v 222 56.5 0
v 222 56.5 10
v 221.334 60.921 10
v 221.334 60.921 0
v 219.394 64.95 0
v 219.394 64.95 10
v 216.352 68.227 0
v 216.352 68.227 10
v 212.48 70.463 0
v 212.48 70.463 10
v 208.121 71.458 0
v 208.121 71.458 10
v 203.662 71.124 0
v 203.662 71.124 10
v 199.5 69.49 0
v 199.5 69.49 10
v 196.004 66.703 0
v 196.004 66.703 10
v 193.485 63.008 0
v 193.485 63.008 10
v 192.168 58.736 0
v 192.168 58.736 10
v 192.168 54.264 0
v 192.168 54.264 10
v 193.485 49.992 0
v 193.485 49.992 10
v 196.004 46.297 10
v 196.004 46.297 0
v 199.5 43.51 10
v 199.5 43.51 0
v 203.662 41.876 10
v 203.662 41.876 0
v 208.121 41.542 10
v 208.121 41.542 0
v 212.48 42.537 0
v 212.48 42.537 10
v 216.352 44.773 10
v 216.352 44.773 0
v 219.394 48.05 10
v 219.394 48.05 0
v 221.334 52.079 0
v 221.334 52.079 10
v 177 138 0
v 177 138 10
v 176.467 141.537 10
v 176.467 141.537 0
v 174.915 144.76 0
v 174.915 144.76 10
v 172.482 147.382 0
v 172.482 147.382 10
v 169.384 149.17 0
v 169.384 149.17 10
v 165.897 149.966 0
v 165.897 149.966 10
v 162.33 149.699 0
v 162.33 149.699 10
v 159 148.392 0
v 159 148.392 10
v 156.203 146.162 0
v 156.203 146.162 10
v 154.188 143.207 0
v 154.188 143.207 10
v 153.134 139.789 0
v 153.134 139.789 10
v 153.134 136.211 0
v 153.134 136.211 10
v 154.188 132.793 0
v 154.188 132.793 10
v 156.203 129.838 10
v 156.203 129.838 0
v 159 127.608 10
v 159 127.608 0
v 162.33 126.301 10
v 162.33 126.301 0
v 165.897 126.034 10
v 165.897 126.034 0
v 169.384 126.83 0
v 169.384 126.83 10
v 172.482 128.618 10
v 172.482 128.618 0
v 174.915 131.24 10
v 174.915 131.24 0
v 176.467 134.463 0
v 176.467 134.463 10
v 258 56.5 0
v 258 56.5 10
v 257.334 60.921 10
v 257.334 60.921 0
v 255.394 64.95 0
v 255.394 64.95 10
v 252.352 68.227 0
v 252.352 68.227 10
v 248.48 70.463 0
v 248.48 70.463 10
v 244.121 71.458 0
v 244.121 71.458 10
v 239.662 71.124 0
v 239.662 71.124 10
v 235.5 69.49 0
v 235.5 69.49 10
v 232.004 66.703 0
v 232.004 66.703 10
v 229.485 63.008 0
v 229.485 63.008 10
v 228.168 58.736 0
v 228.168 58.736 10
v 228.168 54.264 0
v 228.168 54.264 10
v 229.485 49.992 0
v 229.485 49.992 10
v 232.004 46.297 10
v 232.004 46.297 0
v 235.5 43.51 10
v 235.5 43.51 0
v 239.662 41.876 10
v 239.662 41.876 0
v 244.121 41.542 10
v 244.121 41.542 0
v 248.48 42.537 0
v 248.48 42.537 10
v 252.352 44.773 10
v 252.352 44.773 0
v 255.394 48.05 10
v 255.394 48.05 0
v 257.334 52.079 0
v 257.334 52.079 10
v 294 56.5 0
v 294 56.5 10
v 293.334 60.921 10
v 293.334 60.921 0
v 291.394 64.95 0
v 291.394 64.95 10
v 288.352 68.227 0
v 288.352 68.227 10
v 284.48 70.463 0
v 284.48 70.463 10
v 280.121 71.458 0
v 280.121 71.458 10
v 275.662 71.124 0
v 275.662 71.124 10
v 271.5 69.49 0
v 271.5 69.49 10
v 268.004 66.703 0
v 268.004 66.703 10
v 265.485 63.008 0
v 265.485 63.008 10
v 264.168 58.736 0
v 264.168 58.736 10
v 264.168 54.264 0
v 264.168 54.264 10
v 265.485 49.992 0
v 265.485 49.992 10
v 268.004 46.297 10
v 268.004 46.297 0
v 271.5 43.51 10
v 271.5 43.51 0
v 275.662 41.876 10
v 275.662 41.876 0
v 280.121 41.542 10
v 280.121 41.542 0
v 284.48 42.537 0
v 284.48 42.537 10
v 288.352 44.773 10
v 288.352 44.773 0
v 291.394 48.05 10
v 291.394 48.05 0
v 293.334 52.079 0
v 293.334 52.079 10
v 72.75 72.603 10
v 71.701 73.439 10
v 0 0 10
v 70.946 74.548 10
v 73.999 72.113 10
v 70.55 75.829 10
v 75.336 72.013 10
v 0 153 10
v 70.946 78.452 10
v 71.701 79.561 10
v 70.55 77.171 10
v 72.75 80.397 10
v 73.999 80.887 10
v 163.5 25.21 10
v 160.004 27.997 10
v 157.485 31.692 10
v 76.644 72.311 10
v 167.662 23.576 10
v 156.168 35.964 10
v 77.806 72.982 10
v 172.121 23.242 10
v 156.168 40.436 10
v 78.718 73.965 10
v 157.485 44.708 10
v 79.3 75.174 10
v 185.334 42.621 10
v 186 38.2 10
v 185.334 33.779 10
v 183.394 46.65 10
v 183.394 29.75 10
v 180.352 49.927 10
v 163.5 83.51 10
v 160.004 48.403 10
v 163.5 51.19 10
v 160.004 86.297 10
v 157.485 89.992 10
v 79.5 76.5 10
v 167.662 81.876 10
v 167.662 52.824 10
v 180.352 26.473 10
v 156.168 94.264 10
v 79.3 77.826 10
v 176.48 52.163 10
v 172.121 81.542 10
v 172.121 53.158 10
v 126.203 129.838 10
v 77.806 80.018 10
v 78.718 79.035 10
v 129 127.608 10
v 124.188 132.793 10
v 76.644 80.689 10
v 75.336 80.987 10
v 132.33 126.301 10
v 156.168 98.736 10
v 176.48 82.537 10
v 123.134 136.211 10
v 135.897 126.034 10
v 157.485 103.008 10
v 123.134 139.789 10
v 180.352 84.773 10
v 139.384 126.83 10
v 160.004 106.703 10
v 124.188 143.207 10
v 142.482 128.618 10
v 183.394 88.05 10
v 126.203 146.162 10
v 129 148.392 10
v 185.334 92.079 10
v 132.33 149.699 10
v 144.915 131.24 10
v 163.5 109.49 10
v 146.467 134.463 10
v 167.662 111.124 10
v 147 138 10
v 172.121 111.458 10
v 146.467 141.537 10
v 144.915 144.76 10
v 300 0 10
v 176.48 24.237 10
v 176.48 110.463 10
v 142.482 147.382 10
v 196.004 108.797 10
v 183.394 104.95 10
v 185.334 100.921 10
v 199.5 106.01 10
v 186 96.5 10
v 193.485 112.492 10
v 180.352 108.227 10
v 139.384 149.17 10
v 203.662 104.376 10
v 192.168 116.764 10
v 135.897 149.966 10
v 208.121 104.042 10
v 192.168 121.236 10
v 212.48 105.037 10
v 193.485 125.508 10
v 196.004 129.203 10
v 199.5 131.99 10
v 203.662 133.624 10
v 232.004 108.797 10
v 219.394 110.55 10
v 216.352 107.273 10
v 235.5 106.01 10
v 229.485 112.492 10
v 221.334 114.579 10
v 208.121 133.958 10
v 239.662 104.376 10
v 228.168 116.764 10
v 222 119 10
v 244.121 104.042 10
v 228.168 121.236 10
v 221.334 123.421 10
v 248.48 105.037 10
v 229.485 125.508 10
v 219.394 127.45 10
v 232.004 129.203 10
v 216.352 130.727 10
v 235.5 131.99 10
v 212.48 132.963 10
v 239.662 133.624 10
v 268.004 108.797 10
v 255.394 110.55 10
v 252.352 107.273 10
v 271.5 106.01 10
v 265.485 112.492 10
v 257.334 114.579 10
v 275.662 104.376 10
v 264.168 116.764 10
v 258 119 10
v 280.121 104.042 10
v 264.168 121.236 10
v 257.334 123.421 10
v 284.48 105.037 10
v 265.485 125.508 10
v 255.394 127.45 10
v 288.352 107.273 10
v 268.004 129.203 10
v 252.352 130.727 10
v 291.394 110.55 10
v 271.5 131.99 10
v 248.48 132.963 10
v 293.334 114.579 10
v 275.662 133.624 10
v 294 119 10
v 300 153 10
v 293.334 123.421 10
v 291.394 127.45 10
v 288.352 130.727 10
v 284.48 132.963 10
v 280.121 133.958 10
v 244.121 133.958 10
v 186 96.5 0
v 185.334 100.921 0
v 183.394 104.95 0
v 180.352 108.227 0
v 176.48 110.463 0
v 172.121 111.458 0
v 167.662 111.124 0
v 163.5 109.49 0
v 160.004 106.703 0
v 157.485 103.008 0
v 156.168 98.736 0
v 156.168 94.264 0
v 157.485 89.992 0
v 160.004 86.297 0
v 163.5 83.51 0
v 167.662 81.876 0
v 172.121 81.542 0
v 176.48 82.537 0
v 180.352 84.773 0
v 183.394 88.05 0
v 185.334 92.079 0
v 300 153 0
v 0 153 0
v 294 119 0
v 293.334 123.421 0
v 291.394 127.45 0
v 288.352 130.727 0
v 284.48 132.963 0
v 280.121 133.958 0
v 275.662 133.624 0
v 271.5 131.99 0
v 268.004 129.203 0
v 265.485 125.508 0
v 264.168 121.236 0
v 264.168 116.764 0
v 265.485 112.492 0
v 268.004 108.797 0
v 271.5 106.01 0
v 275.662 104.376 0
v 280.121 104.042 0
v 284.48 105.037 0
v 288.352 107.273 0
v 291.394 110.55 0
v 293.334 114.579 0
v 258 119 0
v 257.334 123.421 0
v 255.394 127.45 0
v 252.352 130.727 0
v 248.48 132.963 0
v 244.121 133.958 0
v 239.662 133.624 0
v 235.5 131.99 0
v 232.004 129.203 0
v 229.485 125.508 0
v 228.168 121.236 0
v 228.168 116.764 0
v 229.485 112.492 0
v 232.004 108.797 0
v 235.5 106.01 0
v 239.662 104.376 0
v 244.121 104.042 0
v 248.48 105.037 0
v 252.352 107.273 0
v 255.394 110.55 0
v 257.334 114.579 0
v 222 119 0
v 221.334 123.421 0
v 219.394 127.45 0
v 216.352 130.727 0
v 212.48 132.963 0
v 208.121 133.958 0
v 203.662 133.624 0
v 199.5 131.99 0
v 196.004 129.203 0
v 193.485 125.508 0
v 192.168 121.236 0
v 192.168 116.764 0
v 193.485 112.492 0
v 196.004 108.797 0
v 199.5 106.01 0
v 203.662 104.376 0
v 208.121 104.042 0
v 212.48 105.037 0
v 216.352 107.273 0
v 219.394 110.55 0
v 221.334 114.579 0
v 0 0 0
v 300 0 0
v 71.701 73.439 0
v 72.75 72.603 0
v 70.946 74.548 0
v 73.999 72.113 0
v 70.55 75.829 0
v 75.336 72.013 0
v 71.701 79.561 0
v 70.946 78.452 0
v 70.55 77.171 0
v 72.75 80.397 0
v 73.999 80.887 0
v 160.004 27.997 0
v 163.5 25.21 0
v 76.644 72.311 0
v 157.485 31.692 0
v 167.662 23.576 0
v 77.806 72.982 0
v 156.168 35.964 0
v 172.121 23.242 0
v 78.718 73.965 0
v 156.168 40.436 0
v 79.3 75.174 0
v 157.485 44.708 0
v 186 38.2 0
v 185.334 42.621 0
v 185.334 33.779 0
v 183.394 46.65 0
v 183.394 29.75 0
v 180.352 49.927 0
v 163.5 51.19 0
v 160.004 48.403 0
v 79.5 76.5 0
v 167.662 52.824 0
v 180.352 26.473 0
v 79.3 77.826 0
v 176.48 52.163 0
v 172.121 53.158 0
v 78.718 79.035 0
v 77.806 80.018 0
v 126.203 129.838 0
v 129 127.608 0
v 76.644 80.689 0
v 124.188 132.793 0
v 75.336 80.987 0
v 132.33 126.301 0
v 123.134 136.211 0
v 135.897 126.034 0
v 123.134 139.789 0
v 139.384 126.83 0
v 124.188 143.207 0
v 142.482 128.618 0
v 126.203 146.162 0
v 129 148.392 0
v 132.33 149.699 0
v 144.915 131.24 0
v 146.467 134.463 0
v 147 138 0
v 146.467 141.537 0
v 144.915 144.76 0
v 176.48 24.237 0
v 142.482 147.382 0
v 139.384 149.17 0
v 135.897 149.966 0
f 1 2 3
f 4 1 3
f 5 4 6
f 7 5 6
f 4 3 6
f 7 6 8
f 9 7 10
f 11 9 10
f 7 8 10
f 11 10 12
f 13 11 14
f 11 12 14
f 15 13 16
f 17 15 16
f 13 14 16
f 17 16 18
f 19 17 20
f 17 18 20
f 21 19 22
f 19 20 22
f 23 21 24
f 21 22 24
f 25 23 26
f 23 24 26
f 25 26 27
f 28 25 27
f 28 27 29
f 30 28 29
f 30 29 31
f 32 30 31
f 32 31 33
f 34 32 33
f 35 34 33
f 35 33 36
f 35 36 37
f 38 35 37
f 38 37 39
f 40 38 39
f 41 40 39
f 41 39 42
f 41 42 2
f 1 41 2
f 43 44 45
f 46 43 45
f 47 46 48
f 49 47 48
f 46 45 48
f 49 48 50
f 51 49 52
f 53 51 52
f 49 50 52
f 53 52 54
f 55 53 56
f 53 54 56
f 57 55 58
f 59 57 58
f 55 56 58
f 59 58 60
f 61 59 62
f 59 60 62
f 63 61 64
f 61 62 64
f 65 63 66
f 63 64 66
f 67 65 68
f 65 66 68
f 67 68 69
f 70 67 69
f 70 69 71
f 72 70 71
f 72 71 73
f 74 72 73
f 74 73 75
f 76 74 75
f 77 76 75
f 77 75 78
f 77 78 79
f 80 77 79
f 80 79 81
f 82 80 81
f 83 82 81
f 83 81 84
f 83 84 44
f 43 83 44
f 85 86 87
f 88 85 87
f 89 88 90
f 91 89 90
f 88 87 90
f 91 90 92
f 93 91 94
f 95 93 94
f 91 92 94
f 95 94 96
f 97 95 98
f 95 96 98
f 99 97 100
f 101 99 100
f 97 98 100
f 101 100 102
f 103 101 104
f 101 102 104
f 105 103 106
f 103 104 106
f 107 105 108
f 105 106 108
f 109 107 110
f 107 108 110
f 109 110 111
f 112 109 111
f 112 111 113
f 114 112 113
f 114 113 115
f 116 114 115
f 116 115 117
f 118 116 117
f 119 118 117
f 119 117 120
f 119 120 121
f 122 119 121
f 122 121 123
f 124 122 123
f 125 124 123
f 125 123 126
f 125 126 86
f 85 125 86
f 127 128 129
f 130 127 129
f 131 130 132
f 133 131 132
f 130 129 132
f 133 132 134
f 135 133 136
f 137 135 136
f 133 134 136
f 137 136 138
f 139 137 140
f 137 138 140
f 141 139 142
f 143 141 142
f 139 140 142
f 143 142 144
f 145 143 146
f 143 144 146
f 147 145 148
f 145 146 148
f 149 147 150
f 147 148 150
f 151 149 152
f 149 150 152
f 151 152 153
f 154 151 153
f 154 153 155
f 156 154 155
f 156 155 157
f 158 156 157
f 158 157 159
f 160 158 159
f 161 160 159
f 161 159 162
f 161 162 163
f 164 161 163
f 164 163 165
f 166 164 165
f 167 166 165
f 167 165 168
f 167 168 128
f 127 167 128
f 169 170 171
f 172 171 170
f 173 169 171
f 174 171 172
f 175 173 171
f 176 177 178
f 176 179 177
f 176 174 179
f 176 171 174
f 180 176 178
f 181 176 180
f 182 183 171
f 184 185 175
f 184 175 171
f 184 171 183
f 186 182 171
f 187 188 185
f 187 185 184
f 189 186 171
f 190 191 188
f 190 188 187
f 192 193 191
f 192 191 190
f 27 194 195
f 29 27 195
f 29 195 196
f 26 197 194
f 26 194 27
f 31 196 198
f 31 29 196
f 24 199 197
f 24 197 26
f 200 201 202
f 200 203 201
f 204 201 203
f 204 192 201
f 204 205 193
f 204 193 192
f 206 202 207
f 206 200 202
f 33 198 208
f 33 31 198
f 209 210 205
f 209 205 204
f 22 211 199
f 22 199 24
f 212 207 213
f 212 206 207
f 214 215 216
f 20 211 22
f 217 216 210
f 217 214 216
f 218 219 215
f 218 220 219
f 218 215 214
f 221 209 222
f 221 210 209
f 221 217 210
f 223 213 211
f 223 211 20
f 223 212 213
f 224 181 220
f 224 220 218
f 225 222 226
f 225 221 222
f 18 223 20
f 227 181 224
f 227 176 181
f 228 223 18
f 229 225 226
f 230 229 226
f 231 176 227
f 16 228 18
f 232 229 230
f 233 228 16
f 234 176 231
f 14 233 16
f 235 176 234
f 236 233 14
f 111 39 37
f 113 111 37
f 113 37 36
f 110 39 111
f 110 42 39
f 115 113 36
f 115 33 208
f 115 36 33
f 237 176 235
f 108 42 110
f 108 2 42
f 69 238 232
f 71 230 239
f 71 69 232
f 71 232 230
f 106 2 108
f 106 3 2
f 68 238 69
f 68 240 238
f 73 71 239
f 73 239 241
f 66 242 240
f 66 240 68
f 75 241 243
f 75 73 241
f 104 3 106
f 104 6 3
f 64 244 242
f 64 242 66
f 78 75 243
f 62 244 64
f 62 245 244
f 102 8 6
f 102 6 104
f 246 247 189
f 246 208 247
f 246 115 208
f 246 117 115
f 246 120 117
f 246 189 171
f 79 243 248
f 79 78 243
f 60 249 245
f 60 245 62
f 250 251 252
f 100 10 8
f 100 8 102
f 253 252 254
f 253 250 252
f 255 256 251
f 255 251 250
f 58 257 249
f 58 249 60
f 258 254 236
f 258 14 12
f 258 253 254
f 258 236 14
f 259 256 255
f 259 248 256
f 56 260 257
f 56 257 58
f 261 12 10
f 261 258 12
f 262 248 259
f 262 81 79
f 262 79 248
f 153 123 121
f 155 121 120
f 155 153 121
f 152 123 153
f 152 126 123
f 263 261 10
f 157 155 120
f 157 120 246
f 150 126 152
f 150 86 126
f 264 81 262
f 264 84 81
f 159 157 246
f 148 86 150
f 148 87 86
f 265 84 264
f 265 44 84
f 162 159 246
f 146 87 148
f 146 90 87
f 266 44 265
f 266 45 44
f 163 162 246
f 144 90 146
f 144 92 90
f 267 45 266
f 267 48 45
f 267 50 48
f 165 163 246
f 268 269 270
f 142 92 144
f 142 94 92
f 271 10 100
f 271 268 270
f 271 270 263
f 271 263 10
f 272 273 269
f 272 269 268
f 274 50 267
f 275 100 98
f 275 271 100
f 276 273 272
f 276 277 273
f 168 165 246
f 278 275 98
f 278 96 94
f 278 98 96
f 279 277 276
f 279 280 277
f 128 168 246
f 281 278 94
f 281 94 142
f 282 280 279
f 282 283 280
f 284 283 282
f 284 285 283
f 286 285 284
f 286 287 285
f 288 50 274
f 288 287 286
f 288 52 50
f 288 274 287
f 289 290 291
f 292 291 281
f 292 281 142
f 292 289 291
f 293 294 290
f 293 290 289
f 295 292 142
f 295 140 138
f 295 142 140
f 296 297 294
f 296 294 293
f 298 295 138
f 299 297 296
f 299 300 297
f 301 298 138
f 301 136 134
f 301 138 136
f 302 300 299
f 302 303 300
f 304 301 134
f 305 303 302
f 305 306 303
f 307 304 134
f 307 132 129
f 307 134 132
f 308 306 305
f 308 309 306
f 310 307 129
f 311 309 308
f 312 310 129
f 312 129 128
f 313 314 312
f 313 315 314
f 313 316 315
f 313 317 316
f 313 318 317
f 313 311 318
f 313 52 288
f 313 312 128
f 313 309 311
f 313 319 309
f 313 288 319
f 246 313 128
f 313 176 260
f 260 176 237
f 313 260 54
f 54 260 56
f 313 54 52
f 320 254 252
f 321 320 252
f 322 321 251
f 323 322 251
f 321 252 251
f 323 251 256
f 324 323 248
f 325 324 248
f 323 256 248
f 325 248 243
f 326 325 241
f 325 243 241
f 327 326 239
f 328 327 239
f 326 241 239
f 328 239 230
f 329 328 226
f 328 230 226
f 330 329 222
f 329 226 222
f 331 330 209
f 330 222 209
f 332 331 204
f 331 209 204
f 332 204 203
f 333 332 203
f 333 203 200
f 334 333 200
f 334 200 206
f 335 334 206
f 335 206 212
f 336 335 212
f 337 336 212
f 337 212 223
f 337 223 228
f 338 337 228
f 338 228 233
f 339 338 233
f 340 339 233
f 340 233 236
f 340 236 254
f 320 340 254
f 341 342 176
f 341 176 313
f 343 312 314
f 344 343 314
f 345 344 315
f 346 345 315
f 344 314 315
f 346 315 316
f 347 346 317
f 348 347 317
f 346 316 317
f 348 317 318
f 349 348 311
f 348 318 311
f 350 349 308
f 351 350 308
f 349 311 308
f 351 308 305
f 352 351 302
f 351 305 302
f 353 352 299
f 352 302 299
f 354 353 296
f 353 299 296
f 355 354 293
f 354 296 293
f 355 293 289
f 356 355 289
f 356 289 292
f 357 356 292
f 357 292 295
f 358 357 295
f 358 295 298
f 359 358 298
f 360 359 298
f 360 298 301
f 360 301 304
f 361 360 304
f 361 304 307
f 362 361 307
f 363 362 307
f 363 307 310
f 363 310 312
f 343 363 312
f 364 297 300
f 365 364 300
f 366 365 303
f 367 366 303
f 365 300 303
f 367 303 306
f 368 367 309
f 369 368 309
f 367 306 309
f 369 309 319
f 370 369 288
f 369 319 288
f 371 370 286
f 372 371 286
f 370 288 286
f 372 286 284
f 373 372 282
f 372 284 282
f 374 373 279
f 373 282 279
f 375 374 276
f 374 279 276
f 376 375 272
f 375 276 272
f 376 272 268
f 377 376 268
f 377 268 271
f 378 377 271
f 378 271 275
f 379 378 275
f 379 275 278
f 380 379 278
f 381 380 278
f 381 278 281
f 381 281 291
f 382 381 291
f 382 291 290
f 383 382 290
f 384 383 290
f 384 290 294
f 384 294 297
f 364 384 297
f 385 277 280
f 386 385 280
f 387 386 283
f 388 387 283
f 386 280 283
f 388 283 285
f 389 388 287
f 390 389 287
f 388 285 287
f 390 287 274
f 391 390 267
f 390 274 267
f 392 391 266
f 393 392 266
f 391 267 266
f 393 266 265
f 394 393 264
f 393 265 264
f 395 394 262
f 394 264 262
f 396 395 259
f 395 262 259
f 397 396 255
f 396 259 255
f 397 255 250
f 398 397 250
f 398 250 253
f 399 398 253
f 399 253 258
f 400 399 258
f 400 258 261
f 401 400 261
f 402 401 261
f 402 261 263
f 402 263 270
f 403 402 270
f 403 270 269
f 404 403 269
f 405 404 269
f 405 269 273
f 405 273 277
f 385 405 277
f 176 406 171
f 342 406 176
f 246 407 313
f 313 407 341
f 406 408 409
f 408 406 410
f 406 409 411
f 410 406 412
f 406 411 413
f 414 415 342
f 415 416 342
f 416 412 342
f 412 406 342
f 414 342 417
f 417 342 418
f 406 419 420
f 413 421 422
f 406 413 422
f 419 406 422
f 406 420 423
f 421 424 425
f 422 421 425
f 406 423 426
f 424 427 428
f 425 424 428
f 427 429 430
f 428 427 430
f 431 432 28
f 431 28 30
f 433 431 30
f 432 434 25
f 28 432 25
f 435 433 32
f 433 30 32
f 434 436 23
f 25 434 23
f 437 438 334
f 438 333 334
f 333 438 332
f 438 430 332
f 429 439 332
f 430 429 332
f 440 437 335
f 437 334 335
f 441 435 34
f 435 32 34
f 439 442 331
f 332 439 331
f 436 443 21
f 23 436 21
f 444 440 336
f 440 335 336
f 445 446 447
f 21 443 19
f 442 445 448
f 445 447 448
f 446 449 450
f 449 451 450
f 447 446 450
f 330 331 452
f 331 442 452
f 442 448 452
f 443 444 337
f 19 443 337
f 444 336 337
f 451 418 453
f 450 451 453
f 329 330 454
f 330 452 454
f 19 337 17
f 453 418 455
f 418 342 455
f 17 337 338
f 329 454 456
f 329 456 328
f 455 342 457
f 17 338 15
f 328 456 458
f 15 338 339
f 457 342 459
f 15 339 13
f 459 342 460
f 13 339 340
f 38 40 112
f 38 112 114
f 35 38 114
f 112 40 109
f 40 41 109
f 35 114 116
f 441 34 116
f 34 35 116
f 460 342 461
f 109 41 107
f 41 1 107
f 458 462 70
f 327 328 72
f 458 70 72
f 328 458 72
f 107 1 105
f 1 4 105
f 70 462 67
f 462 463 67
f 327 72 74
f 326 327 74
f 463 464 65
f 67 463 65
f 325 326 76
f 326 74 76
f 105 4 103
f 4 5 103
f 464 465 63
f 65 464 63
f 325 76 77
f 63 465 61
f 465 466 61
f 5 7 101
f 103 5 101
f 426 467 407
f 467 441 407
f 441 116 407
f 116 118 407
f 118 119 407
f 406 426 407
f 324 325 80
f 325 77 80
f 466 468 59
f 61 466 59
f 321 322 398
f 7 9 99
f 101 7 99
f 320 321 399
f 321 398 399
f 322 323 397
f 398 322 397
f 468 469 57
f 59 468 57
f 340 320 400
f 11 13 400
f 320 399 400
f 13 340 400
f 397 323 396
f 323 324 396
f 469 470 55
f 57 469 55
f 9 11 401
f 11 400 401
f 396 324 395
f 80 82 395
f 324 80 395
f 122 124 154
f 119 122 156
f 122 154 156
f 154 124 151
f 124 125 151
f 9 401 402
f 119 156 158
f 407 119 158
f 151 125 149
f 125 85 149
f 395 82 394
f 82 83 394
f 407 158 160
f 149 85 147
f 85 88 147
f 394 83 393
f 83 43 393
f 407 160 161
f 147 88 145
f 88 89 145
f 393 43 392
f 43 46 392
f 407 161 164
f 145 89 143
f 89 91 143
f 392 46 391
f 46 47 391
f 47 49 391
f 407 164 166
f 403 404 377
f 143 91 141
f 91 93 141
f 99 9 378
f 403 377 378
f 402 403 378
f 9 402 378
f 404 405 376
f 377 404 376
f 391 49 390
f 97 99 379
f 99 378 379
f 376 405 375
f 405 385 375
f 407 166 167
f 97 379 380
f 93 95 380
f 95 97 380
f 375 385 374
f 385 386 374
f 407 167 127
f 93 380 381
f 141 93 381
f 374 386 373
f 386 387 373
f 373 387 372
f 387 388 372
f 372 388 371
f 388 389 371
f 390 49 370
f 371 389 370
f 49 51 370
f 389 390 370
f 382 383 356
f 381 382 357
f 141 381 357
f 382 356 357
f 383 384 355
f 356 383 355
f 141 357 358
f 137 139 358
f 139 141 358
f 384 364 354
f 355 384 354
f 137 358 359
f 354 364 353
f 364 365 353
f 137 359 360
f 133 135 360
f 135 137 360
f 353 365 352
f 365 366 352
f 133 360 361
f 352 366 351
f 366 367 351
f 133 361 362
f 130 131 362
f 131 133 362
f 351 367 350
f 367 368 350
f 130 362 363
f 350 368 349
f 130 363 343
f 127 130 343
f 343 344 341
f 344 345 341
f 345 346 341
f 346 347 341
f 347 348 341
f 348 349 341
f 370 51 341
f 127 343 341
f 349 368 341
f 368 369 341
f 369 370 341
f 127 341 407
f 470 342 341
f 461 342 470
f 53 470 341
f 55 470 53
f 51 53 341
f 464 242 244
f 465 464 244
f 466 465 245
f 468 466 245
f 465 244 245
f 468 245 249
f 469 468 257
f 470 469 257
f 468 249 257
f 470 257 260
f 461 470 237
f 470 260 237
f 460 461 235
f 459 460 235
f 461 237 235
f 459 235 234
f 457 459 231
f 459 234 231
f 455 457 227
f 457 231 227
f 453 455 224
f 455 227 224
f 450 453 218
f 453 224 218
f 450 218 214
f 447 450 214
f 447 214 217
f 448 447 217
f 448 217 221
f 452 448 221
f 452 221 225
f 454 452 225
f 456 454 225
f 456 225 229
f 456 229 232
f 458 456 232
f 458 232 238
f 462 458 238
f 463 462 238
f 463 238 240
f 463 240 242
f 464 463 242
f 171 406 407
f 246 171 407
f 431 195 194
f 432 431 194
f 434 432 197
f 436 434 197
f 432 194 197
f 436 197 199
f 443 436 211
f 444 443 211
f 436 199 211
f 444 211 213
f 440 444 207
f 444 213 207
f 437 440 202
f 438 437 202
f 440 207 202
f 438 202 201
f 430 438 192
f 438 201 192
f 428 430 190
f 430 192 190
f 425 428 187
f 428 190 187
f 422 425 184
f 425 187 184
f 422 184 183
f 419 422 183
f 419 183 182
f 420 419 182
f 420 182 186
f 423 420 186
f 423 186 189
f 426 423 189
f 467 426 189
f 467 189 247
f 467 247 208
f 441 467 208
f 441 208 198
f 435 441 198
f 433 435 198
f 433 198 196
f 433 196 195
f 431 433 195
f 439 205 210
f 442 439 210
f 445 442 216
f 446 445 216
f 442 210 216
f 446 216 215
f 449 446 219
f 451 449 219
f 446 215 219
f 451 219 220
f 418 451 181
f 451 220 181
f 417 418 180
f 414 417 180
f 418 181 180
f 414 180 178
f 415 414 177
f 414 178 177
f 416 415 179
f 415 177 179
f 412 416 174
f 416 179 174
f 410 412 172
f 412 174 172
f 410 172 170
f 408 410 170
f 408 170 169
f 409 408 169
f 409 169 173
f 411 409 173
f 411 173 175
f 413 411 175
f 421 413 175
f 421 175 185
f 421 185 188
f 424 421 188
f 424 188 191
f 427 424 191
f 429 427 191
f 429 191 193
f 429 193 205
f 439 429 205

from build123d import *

# Parameters (mm, degrees)
ESQUISSE1_W              = 300
ESQUISSE1_H              = 153
BOSS_EXTRU_1_DEPTH       = 10
ESQUISSE7_R              = 15
ENL_V_MAT_EXTRU_5_DEPTH  = 11
ESQUISSE8_R              = 15
ENL_V_MAT_EXTRU_6_DEPTH  = 11
ESQUISSE9_R              = 15
ENL_V_MAT_EXTRU_7_DEPTH  = 11
ESQUISSE10_R             = 15
ENL_V_MAT_EXTRU_8_DEPTH  = 11
ESQUISSE11_R             = 15
ENL_V_MAT_EXTRU_9_DEPTH  = 11
ESQUISSE12_R             = 15
ENL_V_MAT_EXTRU_10_DEPTH = 11
ESQUISSE13_R             = 15
ENL_V_MAT_EXTRU_11_DEPTH = 11
ESQUISSE14_R             = 15
ENL_V_MAT_EXTRU_12_DEPTH = 11
ESQUISSE16_R             = 12
ENL_V_MAT_EXTRU_14_DEPTH = 11
ESQUISSE17_R             = 12
ENL_V_MAT_EXTRU_15_DEPTH = 11
ESQUISSE2_R              = 4.5
ENL_V_MAT_EXTRU_16_DEPTH = 11


with BuildPart() as part:
    # Esquisse1 → Boss.-Extru.1 (new body)
    with BuildSketch(Plane.XY):
        with Locations((150, 76.5)):
            Rectangle(ESQUISSE1_W, ESQUISSE1_H)
    extrude(amount=BOSS_EXTRU_1_DEPTH)

    # Esquisse7 → Enlèv. mat.-Extru.5 (cut, through all)
    with BuildSketch(Plane.XY.offset(10)):
        with Locations((171, 96.5)):
            Circle(ESQUISSE7_R)
    extrude(amount=-ENL_V_MAT_EXTRU_5_DEPTH, mode=Mode.SUBTRACT)

    # Esquisse8 → Enlèv. mat.-Extru.6 (cut, through all)
    with BuildSketch(Plane.XY.offset(10)):
        with Locations((207, 119)):
            Circle(ESQUISSE8_R)
    extrude(amount=-ENL_V_MAT_EXTRU_6_DEPTH, mode=Mode.SUBTRACT)

    # Esquisse9 → Enlèv. mat.-Extru.7 (cut, through all)
    with BuildSketch(Plane.XY.offset(10)):
        with Locations((243, 119)):
            Circle(ESQUISSE9_R)
    extrude(amount=-ENL_V_MAT_EXTRU_7_DEPTH, mode=Mode.SUBTRACT)

    # Esquisse10 → Enlèv. mat.-Extru.8 (cut, through all)
    with BuildSketch(Plane.XY.offset(10)):
        with Locations((279, 119)):
            Circle(ESQUISSE10_R)
    extrude(amount=-ENL_V_MAT_EXTRU_8_DEPTH, mode=Mode.SUBTRACT)

    # Esquisse11 → Enlèv. mat.-Extru.9 (cut, through all)
    with BuildSketch(Plane.XY.offset(10)):
        with Locations((171, 38.2)):
            Circle(ESQUISSE11_R)
    extrude(amount=-ENL_V_MAT_EXTRU_9_DEPTH, mode=Mode.SUBTRACT)

    # Esquisse12 → Enlèv. mat.-Extru.10 (cut, through all)
    with BuildSketch(Plane.XY.offset(10)):
        with Locations((207, 56.5)):
            Circle(ESQUISSE12_R)
    extrude(amount=-ENL_V_MAT_EXTRU_10_DEPTH, mode=Mode.SUBTRACT)

    # Esquisse13 → Enlèv. mat.-Extru.11 (cut, through all)
    with BuildSketch(Plane.XY.offset(10)):
        with Locations((243, 56.5)):
            Circle(ESQUISSE13_R)
    extrude(amount=-ENL_V_MAT_EXTRU_11_DEPTH, mode=Mode.SUBTRACT)

    # Esquisse14 → Enlèv. mat.-Extru.12 (cut, through all)
    with BuildSketch(Plane.XY.offset(10)):
        with Locations((279, 56.5)):
            Circle(ESQUISSE14_R)
    extrude(amount=-ENL_V_MAT_EXTRU_12_DEPTH, mode=Mode.SUBTRACT)

    # Esquisse16 → Enlèv. mat.-Extru.14 (cut, through all)
    with BuildSketch(Plane.XY.offset(10)):
        with Locations((165, 138)):
            Circle(ESQUISSE16_R)
    extrude(amount=-ENL_V_MAT_EXTRU_14_DEPTH, mode=Mode.SUBTRACT)

    # Esquisse17 → Enlèv. mat.-Extru.15 (cut, through all)
    with BuildSketch(Plane.XY.offset(10)):
        with Locations((135, 138)):
            Circle(ESQUISSE17_R)
    extrude(amount=-ENL_V_MAT_EXTRU_15_DEPTH, mode=Mode.SUBTRACT)

    # Esquisse2 → Enlèv. mat.-Extru.16 (cut, through all)
    with BuildSketch(Plane.XY.offset(10)):
        with Locations((75, 76.5)):
            Circle(ESQUISSE2_R)
    extrude(amount=-ENL_V_MAT_EXTRU_16_DEPTH, mode=Mode.SUBTRACT)


solid = part.part
